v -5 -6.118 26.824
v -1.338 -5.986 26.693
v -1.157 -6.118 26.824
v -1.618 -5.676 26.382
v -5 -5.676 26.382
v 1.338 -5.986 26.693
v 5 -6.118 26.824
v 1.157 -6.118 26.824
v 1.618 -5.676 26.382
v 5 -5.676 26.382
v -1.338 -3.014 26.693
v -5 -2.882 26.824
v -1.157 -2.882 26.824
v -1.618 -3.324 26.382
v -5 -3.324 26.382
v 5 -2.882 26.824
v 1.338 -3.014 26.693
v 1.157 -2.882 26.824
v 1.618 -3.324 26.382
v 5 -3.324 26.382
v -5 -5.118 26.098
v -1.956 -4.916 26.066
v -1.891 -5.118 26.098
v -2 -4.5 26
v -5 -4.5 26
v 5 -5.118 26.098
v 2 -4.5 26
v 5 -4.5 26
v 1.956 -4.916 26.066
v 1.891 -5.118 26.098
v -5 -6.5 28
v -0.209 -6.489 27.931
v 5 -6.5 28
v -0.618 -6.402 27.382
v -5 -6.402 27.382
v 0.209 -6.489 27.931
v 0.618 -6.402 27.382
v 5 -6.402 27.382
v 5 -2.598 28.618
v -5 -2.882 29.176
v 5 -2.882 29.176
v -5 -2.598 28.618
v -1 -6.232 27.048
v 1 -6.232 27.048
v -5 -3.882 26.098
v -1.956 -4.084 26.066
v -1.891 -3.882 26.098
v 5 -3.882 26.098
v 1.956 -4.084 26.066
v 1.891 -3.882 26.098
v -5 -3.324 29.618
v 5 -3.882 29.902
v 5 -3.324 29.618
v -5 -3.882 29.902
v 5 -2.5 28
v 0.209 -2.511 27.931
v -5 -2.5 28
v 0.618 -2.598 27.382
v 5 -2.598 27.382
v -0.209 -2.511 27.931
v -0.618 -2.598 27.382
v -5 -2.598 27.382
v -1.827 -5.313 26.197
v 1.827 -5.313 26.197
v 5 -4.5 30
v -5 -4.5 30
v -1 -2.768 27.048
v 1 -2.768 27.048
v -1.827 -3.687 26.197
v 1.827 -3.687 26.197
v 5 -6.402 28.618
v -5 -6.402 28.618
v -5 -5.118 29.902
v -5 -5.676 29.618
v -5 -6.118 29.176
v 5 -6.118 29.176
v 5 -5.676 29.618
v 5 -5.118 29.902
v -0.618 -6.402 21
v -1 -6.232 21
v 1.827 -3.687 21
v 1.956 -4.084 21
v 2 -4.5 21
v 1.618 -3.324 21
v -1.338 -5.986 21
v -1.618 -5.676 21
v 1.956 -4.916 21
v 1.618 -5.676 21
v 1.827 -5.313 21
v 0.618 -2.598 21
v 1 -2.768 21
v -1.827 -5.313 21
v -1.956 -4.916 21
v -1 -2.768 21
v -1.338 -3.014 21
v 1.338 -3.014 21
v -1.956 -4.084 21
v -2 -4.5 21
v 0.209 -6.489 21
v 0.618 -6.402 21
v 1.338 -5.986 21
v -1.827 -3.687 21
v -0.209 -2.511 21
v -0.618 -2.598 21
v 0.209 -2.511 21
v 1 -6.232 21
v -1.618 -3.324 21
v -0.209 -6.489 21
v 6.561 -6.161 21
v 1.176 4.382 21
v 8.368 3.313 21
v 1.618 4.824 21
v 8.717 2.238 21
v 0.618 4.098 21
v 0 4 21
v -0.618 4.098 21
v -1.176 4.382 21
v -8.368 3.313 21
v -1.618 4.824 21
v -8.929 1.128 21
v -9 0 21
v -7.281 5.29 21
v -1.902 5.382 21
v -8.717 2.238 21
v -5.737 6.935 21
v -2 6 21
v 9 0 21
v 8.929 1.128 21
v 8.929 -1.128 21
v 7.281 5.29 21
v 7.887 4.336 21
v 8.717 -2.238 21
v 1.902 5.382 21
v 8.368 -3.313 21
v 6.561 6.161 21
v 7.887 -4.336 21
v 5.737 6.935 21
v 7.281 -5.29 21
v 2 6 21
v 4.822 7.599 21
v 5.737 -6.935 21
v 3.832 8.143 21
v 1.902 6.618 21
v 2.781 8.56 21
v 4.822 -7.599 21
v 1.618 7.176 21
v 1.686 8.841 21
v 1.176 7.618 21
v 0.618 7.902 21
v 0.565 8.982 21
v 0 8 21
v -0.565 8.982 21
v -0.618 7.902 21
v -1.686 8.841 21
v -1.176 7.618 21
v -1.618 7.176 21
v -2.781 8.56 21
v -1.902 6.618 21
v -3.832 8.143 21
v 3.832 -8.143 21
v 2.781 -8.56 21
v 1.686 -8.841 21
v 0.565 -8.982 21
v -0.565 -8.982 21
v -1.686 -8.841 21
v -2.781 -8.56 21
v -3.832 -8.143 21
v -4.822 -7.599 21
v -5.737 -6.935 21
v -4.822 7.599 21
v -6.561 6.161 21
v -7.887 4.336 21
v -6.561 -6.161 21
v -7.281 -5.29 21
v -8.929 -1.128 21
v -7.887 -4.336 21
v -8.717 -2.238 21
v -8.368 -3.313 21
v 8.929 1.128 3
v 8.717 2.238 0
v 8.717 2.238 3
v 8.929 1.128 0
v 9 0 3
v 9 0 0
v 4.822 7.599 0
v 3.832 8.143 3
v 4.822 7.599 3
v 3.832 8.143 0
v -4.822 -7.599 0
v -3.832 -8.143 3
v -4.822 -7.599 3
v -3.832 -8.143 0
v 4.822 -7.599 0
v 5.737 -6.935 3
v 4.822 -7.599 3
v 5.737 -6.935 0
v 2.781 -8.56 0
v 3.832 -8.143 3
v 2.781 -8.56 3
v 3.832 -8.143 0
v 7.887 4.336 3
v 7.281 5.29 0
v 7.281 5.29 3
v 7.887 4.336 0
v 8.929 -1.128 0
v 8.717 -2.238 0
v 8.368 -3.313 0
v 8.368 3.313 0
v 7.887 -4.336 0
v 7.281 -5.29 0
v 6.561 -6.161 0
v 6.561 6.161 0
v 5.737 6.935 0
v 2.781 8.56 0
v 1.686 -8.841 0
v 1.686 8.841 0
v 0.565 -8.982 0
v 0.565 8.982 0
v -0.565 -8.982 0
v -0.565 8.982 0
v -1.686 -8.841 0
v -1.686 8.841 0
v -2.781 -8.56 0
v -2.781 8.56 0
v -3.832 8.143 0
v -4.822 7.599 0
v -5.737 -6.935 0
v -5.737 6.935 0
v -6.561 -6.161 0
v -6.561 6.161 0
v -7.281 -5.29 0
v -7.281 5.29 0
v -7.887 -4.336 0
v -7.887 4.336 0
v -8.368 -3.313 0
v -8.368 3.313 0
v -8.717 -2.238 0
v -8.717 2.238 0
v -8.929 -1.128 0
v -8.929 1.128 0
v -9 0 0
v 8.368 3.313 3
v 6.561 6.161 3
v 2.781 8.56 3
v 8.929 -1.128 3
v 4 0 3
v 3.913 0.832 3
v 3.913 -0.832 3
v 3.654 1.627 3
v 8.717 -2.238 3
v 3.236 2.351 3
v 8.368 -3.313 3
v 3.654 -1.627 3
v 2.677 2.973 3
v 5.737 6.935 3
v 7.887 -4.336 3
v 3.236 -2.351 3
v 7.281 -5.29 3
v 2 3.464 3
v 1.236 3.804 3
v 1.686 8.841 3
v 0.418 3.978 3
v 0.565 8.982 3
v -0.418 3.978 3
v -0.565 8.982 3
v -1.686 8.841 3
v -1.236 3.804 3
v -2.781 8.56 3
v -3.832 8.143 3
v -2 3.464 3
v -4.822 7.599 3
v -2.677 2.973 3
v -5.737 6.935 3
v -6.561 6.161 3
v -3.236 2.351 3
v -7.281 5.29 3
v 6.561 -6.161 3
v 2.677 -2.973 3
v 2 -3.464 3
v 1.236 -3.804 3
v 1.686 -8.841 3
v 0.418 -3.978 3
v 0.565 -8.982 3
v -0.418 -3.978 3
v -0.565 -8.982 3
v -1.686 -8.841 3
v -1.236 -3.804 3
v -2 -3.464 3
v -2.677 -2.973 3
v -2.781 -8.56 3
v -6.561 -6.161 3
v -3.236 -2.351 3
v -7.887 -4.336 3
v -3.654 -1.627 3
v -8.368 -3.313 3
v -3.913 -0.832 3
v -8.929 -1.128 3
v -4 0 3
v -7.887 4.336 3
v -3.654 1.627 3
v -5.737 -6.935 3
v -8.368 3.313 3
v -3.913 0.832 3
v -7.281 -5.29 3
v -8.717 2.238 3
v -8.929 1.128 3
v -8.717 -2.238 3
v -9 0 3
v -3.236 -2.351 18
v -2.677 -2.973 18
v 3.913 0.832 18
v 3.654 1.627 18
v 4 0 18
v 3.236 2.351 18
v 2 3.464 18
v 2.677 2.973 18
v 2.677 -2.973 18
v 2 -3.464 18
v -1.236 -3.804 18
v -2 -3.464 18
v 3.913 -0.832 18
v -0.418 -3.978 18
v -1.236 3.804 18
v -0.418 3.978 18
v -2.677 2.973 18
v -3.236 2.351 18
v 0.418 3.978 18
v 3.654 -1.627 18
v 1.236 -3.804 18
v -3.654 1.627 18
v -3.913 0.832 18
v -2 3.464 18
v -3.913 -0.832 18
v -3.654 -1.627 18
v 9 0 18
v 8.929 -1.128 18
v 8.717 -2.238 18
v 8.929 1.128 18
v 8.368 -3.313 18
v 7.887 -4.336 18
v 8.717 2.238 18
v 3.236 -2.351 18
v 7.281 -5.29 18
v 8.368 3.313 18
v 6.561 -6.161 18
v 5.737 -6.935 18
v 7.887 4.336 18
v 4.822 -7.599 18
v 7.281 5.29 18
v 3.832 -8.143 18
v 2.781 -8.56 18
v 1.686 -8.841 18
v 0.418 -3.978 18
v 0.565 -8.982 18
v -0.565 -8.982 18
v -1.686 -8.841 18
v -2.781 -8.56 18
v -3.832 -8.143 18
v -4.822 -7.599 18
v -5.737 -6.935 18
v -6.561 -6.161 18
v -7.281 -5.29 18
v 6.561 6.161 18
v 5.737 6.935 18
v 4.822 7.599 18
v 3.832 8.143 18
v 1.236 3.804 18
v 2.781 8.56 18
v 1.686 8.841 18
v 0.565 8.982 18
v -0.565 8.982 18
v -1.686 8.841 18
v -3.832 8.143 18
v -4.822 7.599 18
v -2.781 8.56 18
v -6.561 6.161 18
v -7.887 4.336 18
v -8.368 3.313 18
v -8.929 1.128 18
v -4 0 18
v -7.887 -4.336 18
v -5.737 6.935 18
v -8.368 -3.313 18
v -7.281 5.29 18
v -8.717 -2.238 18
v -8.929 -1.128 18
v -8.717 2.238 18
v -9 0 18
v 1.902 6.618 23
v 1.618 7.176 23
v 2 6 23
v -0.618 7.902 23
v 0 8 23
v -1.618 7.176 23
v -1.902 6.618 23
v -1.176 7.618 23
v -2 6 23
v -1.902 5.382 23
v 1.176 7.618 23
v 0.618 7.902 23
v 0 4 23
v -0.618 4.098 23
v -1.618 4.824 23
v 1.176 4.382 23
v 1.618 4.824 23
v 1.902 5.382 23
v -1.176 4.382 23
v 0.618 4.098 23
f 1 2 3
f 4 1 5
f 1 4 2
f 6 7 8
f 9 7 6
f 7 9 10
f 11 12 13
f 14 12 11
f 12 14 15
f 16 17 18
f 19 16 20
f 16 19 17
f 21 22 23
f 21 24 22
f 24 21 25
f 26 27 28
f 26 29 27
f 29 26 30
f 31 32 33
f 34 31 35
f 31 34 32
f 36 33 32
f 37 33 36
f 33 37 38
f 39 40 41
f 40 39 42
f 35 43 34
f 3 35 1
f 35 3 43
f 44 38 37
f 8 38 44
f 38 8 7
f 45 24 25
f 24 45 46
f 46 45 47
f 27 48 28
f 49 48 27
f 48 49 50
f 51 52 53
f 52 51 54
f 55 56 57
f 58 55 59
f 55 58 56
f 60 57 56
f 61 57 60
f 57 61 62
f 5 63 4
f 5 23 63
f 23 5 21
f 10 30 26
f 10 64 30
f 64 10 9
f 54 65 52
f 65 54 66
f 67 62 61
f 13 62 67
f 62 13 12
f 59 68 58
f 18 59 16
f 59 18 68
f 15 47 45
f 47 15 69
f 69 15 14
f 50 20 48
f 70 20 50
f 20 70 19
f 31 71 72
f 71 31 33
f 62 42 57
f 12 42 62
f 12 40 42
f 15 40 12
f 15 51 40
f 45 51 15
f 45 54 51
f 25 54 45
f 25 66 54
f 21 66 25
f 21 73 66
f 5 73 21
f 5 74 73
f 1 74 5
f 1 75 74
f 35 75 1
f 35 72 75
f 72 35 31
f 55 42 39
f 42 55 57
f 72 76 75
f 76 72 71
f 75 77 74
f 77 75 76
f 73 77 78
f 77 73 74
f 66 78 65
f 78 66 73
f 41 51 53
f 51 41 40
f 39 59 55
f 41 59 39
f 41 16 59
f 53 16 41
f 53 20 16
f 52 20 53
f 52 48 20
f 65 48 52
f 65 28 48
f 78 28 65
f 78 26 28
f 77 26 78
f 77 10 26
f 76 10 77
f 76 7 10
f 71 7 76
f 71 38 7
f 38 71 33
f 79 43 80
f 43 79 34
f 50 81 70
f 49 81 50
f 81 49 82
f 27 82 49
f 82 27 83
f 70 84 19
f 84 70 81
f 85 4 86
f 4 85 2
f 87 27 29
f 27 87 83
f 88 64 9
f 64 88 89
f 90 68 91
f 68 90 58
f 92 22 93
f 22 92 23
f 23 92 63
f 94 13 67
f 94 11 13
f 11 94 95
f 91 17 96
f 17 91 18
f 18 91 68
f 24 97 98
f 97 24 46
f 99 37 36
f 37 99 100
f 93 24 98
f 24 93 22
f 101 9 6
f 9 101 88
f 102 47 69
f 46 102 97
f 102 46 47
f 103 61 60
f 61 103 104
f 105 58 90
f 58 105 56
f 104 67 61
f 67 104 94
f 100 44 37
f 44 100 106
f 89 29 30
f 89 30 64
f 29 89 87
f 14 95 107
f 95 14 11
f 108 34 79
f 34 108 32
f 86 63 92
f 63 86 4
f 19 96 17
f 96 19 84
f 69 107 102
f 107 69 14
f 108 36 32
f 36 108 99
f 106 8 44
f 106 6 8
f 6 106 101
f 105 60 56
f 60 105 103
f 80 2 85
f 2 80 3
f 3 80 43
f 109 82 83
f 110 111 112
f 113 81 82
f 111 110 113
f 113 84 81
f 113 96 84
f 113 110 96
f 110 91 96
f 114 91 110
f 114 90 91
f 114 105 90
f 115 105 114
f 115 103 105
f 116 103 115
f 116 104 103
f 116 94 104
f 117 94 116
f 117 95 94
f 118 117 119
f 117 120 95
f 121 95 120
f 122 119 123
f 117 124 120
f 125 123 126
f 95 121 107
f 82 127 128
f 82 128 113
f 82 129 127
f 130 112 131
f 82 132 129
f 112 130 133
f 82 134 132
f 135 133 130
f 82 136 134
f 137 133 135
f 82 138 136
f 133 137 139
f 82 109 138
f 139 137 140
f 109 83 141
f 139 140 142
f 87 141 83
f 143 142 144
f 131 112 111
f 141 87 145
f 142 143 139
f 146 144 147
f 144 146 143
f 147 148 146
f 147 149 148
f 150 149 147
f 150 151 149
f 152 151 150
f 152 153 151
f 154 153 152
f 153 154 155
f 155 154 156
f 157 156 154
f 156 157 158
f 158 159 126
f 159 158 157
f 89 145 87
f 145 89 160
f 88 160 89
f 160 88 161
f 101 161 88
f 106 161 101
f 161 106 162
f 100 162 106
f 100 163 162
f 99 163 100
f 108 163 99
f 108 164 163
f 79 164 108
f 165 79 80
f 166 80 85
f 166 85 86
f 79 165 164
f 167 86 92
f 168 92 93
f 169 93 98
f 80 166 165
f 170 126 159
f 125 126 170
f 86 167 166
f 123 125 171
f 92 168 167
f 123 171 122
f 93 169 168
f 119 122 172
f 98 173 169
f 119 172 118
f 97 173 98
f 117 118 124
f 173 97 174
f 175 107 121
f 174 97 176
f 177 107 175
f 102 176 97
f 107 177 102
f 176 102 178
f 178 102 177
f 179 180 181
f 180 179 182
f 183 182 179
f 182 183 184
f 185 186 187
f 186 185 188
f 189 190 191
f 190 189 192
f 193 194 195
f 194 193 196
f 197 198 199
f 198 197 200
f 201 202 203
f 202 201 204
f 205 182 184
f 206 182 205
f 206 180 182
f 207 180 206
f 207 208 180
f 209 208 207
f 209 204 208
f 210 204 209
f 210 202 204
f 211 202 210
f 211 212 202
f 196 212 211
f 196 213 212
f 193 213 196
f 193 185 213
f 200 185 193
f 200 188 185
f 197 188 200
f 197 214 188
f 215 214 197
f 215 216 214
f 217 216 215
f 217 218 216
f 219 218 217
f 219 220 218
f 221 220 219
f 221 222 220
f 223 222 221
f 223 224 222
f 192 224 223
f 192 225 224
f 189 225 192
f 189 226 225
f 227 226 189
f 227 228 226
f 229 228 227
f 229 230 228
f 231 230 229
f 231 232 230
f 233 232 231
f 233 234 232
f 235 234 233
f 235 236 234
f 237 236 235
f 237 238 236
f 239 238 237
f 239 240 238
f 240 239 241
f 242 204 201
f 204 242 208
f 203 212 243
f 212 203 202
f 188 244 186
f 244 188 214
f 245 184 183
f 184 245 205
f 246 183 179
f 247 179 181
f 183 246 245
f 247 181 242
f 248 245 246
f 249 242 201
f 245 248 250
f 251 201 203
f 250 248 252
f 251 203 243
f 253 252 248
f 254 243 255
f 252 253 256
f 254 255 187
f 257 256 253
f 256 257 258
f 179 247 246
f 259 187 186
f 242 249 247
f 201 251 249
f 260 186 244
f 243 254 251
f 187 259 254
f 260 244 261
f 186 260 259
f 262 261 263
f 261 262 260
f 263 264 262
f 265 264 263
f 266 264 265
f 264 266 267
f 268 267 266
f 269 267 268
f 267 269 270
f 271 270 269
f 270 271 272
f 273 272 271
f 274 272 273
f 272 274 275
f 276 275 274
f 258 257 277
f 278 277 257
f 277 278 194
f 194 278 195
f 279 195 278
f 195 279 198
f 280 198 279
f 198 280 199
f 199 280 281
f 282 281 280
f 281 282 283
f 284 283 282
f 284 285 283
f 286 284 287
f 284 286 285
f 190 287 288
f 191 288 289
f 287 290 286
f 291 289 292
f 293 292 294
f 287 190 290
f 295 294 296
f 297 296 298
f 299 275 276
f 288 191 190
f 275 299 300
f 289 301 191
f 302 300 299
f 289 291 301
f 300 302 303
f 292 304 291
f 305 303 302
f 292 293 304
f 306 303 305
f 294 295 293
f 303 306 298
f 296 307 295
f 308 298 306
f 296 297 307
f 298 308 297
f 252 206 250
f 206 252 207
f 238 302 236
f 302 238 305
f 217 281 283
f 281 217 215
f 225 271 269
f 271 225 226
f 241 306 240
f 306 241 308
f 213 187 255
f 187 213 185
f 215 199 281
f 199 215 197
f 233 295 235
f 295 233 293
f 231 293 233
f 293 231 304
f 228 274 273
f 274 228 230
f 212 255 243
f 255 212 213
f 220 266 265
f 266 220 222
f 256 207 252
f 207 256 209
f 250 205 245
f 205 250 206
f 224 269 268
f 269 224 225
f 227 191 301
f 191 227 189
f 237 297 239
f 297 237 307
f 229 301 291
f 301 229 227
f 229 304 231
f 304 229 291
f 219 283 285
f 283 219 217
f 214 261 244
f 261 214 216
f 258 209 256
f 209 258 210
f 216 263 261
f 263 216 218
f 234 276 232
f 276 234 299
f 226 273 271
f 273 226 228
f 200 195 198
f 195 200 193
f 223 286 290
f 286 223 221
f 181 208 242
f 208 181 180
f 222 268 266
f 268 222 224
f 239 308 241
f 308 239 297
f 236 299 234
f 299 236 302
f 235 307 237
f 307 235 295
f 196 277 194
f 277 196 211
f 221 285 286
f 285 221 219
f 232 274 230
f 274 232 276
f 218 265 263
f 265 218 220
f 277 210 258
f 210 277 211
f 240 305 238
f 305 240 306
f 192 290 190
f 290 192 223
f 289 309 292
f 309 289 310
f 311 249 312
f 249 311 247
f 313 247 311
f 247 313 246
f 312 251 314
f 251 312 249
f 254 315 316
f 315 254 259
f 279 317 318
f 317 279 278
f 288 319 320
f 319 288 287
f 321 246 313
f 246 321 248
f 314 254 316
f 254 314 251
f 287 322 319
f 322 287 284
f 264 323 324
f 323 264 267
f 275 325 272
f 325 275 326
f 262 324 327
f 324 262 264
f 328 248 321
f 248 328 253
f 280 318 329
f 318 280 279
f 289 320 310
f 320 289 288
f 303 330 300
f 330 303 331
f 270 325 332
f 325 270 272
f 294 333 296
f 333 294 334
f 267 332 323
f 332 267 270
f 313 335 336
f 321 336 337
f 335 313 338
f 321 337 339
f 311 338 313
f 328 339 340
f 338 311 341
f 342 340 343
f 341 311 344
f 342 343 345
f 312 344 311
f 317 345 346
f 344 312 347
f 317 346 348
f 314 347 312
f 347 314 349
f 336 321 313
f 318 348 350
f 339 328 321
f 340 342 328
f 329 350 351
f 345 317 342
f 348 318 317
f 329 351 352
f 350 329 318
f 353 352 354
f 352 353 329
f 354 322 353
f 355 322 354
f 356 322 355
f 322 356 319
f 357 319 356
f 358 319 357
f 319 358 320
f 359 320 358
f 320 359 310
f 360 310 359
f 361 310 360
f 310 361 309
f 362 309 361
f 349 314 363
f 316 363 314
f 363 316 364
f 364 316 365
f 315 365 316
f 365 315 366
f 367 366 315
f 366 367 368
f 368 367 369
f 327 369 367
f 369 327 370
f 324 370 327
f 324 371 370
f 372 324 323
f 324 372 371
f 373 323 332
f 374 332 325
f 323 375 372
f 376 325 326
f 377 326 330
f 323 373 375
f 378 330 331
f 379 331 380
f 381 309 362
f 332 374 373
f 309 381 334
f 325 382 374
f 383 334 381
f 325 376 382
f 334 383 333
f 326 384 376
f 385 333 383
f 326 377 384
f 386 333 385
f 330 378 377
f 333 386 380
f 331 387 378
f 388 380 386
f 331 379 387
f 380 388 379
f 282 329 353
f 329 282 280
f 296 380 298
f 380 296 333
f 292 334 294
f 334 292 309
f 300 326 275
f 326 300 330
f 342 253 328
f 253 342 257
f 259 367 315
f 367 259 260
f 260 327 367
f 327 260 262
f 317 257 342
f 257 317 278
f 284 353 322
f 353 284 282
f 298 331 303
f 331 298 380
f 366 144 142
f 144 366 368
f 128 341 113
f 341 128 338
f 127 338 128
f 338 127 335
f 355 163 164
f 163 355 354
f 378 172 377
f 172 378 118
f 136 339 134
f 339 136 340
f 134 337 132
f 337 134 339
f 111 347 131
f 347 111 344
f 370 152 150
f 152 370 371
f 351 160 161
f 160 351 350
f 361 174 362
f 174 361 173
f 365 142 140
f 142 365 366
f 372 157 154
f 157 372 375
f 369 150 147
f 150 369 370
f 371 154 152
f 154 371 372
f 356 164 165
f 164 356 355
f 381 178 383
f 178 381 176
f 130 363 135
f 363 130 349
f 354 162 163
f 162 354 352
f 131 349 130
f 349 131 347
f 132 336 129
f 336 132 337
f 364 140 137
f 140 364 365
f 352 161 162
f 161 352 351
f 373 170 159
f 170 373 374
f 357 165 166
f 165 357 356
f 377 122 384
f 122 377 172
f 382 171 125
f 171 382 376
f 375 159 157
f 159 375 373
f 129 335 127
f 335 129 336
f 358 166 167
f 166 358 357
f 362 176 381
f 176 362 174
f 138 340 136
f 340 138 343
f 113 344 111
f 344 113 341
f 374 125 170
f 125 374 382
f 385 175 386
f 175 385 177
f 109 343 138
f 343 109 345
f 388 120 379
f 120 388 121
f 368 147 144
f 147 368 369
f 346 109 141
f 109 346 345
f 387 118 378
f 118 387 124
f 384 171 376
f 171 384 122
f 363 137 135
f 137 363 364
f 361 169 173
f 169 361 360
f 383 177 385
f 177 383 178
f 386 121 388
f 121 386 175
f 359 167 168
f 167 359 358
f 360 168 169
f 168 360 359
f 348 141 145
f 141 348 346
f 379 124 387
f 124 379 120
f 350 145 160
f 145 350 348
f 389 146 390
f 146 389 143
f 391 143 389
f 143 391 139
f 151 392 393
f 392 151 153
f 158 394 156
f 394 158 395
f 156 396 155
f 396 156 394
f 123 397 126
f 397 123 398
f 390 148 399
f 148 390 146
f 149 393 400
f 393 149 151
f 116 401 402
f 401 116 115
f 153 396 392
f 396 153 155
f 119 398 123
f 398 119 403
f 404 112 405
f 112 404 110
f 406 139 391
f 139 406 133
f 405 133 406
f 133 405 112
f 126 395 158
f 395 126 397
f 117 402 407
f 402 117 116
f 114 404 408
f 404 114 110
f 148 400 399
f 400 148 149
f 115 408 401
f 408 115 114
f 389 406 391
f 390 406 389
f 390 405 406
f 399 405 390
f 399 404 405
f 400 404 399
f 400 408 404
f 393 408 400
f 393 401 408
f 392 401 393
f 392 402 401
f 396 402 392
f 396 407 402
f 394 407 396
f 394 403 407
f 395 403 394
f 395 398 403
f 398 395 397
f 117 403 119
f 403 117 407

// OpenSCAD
// Correct IKEA-style mounting pin based on actual design
// Symmetrical double-disc design with T-mechanism on one side

// Main pin parameters
head_disk_diameter = 18;        // Main head disks
head_disk_thickness = 3;        // Thickness of each disk
connecting_pipe_length = 15;    // 1.5cm pipe between disks
connecting_pipe_diameter = 8;   // 0.8cm pipe diameter

// T-mechanism parameters (on one disk)
t_pipe_diameter = 4;            // T stem diameter
t_pipe_height = 5;              // T stem height (without arms)
t_arms_total_length = 20;       // Total arm span (2cm)
t_arm_thickness = 2;            // Thickness of T arms

// Small nub parameters
nub_diameter = 4;               // 4mm nub
nub_height = 2;                 // 2mm high

module ikea_pin() {
    union() {
        // Bottom disk (plain)
        translate([0, 0, 0])
        cylinder(h = head_disk_thickness, d = head_disk_diameter, $fn = 50);
        
        // Connecting pipe
        translate([0, 0, head_disk_thickness])
        cylinder(h = connecting_pipe_length, d = connecting_pipe_diameter, $fn = 30);
        
        // Top disk (with mechanisms)
        translate([0, 0, head_disk_thickness + connecting_pipe_length])
        cylinder(h = head_disk_thickness, d = head_disk_diameter, $fn = 50);
        
        // Small nub (positioned at 12 o'clock)
        translate([0, head_disk_diameter/3, head_disk_thickness + connecting_pipe_length + head_disk_thickness]) {
            cylinder(h = nub_height, d = nub_diameter, $fn = 20);
        }
        
        // T-mechanism on top disk (positioned at 6 o'clock, opposite to nub)
        translate([0, -head_disk_diameter/4, head_disk_thickness + connecting_pipe_length + head_disk_thickness]) {
            // T stem (extended higher to blend with arms)
            cylinder(h = t_pipe_height + t_pipe_diameter/2, d = t_pipe_diameter, $fn = 30);
            
            // T arms (cylindrical, each 0.5cm long, positioned to blend with stem)
            translate([0, 0, t_pipe_height + t_pipe_diameter/2]) {
                // Left arm
                translate([-5, 0, 0])
                rotate([0, 90, 0])
                cylinder(h = 5, d = t_pipe_diameter, $fn = 20);
                
                // Right arm  
                translate([0, 0, 0])
                rotate([0, 90, 0])
                cylinder(h = 5, d = t_pipe_diameter, $fn = 20);
            }
        }
    }
}

ikea_pin();
